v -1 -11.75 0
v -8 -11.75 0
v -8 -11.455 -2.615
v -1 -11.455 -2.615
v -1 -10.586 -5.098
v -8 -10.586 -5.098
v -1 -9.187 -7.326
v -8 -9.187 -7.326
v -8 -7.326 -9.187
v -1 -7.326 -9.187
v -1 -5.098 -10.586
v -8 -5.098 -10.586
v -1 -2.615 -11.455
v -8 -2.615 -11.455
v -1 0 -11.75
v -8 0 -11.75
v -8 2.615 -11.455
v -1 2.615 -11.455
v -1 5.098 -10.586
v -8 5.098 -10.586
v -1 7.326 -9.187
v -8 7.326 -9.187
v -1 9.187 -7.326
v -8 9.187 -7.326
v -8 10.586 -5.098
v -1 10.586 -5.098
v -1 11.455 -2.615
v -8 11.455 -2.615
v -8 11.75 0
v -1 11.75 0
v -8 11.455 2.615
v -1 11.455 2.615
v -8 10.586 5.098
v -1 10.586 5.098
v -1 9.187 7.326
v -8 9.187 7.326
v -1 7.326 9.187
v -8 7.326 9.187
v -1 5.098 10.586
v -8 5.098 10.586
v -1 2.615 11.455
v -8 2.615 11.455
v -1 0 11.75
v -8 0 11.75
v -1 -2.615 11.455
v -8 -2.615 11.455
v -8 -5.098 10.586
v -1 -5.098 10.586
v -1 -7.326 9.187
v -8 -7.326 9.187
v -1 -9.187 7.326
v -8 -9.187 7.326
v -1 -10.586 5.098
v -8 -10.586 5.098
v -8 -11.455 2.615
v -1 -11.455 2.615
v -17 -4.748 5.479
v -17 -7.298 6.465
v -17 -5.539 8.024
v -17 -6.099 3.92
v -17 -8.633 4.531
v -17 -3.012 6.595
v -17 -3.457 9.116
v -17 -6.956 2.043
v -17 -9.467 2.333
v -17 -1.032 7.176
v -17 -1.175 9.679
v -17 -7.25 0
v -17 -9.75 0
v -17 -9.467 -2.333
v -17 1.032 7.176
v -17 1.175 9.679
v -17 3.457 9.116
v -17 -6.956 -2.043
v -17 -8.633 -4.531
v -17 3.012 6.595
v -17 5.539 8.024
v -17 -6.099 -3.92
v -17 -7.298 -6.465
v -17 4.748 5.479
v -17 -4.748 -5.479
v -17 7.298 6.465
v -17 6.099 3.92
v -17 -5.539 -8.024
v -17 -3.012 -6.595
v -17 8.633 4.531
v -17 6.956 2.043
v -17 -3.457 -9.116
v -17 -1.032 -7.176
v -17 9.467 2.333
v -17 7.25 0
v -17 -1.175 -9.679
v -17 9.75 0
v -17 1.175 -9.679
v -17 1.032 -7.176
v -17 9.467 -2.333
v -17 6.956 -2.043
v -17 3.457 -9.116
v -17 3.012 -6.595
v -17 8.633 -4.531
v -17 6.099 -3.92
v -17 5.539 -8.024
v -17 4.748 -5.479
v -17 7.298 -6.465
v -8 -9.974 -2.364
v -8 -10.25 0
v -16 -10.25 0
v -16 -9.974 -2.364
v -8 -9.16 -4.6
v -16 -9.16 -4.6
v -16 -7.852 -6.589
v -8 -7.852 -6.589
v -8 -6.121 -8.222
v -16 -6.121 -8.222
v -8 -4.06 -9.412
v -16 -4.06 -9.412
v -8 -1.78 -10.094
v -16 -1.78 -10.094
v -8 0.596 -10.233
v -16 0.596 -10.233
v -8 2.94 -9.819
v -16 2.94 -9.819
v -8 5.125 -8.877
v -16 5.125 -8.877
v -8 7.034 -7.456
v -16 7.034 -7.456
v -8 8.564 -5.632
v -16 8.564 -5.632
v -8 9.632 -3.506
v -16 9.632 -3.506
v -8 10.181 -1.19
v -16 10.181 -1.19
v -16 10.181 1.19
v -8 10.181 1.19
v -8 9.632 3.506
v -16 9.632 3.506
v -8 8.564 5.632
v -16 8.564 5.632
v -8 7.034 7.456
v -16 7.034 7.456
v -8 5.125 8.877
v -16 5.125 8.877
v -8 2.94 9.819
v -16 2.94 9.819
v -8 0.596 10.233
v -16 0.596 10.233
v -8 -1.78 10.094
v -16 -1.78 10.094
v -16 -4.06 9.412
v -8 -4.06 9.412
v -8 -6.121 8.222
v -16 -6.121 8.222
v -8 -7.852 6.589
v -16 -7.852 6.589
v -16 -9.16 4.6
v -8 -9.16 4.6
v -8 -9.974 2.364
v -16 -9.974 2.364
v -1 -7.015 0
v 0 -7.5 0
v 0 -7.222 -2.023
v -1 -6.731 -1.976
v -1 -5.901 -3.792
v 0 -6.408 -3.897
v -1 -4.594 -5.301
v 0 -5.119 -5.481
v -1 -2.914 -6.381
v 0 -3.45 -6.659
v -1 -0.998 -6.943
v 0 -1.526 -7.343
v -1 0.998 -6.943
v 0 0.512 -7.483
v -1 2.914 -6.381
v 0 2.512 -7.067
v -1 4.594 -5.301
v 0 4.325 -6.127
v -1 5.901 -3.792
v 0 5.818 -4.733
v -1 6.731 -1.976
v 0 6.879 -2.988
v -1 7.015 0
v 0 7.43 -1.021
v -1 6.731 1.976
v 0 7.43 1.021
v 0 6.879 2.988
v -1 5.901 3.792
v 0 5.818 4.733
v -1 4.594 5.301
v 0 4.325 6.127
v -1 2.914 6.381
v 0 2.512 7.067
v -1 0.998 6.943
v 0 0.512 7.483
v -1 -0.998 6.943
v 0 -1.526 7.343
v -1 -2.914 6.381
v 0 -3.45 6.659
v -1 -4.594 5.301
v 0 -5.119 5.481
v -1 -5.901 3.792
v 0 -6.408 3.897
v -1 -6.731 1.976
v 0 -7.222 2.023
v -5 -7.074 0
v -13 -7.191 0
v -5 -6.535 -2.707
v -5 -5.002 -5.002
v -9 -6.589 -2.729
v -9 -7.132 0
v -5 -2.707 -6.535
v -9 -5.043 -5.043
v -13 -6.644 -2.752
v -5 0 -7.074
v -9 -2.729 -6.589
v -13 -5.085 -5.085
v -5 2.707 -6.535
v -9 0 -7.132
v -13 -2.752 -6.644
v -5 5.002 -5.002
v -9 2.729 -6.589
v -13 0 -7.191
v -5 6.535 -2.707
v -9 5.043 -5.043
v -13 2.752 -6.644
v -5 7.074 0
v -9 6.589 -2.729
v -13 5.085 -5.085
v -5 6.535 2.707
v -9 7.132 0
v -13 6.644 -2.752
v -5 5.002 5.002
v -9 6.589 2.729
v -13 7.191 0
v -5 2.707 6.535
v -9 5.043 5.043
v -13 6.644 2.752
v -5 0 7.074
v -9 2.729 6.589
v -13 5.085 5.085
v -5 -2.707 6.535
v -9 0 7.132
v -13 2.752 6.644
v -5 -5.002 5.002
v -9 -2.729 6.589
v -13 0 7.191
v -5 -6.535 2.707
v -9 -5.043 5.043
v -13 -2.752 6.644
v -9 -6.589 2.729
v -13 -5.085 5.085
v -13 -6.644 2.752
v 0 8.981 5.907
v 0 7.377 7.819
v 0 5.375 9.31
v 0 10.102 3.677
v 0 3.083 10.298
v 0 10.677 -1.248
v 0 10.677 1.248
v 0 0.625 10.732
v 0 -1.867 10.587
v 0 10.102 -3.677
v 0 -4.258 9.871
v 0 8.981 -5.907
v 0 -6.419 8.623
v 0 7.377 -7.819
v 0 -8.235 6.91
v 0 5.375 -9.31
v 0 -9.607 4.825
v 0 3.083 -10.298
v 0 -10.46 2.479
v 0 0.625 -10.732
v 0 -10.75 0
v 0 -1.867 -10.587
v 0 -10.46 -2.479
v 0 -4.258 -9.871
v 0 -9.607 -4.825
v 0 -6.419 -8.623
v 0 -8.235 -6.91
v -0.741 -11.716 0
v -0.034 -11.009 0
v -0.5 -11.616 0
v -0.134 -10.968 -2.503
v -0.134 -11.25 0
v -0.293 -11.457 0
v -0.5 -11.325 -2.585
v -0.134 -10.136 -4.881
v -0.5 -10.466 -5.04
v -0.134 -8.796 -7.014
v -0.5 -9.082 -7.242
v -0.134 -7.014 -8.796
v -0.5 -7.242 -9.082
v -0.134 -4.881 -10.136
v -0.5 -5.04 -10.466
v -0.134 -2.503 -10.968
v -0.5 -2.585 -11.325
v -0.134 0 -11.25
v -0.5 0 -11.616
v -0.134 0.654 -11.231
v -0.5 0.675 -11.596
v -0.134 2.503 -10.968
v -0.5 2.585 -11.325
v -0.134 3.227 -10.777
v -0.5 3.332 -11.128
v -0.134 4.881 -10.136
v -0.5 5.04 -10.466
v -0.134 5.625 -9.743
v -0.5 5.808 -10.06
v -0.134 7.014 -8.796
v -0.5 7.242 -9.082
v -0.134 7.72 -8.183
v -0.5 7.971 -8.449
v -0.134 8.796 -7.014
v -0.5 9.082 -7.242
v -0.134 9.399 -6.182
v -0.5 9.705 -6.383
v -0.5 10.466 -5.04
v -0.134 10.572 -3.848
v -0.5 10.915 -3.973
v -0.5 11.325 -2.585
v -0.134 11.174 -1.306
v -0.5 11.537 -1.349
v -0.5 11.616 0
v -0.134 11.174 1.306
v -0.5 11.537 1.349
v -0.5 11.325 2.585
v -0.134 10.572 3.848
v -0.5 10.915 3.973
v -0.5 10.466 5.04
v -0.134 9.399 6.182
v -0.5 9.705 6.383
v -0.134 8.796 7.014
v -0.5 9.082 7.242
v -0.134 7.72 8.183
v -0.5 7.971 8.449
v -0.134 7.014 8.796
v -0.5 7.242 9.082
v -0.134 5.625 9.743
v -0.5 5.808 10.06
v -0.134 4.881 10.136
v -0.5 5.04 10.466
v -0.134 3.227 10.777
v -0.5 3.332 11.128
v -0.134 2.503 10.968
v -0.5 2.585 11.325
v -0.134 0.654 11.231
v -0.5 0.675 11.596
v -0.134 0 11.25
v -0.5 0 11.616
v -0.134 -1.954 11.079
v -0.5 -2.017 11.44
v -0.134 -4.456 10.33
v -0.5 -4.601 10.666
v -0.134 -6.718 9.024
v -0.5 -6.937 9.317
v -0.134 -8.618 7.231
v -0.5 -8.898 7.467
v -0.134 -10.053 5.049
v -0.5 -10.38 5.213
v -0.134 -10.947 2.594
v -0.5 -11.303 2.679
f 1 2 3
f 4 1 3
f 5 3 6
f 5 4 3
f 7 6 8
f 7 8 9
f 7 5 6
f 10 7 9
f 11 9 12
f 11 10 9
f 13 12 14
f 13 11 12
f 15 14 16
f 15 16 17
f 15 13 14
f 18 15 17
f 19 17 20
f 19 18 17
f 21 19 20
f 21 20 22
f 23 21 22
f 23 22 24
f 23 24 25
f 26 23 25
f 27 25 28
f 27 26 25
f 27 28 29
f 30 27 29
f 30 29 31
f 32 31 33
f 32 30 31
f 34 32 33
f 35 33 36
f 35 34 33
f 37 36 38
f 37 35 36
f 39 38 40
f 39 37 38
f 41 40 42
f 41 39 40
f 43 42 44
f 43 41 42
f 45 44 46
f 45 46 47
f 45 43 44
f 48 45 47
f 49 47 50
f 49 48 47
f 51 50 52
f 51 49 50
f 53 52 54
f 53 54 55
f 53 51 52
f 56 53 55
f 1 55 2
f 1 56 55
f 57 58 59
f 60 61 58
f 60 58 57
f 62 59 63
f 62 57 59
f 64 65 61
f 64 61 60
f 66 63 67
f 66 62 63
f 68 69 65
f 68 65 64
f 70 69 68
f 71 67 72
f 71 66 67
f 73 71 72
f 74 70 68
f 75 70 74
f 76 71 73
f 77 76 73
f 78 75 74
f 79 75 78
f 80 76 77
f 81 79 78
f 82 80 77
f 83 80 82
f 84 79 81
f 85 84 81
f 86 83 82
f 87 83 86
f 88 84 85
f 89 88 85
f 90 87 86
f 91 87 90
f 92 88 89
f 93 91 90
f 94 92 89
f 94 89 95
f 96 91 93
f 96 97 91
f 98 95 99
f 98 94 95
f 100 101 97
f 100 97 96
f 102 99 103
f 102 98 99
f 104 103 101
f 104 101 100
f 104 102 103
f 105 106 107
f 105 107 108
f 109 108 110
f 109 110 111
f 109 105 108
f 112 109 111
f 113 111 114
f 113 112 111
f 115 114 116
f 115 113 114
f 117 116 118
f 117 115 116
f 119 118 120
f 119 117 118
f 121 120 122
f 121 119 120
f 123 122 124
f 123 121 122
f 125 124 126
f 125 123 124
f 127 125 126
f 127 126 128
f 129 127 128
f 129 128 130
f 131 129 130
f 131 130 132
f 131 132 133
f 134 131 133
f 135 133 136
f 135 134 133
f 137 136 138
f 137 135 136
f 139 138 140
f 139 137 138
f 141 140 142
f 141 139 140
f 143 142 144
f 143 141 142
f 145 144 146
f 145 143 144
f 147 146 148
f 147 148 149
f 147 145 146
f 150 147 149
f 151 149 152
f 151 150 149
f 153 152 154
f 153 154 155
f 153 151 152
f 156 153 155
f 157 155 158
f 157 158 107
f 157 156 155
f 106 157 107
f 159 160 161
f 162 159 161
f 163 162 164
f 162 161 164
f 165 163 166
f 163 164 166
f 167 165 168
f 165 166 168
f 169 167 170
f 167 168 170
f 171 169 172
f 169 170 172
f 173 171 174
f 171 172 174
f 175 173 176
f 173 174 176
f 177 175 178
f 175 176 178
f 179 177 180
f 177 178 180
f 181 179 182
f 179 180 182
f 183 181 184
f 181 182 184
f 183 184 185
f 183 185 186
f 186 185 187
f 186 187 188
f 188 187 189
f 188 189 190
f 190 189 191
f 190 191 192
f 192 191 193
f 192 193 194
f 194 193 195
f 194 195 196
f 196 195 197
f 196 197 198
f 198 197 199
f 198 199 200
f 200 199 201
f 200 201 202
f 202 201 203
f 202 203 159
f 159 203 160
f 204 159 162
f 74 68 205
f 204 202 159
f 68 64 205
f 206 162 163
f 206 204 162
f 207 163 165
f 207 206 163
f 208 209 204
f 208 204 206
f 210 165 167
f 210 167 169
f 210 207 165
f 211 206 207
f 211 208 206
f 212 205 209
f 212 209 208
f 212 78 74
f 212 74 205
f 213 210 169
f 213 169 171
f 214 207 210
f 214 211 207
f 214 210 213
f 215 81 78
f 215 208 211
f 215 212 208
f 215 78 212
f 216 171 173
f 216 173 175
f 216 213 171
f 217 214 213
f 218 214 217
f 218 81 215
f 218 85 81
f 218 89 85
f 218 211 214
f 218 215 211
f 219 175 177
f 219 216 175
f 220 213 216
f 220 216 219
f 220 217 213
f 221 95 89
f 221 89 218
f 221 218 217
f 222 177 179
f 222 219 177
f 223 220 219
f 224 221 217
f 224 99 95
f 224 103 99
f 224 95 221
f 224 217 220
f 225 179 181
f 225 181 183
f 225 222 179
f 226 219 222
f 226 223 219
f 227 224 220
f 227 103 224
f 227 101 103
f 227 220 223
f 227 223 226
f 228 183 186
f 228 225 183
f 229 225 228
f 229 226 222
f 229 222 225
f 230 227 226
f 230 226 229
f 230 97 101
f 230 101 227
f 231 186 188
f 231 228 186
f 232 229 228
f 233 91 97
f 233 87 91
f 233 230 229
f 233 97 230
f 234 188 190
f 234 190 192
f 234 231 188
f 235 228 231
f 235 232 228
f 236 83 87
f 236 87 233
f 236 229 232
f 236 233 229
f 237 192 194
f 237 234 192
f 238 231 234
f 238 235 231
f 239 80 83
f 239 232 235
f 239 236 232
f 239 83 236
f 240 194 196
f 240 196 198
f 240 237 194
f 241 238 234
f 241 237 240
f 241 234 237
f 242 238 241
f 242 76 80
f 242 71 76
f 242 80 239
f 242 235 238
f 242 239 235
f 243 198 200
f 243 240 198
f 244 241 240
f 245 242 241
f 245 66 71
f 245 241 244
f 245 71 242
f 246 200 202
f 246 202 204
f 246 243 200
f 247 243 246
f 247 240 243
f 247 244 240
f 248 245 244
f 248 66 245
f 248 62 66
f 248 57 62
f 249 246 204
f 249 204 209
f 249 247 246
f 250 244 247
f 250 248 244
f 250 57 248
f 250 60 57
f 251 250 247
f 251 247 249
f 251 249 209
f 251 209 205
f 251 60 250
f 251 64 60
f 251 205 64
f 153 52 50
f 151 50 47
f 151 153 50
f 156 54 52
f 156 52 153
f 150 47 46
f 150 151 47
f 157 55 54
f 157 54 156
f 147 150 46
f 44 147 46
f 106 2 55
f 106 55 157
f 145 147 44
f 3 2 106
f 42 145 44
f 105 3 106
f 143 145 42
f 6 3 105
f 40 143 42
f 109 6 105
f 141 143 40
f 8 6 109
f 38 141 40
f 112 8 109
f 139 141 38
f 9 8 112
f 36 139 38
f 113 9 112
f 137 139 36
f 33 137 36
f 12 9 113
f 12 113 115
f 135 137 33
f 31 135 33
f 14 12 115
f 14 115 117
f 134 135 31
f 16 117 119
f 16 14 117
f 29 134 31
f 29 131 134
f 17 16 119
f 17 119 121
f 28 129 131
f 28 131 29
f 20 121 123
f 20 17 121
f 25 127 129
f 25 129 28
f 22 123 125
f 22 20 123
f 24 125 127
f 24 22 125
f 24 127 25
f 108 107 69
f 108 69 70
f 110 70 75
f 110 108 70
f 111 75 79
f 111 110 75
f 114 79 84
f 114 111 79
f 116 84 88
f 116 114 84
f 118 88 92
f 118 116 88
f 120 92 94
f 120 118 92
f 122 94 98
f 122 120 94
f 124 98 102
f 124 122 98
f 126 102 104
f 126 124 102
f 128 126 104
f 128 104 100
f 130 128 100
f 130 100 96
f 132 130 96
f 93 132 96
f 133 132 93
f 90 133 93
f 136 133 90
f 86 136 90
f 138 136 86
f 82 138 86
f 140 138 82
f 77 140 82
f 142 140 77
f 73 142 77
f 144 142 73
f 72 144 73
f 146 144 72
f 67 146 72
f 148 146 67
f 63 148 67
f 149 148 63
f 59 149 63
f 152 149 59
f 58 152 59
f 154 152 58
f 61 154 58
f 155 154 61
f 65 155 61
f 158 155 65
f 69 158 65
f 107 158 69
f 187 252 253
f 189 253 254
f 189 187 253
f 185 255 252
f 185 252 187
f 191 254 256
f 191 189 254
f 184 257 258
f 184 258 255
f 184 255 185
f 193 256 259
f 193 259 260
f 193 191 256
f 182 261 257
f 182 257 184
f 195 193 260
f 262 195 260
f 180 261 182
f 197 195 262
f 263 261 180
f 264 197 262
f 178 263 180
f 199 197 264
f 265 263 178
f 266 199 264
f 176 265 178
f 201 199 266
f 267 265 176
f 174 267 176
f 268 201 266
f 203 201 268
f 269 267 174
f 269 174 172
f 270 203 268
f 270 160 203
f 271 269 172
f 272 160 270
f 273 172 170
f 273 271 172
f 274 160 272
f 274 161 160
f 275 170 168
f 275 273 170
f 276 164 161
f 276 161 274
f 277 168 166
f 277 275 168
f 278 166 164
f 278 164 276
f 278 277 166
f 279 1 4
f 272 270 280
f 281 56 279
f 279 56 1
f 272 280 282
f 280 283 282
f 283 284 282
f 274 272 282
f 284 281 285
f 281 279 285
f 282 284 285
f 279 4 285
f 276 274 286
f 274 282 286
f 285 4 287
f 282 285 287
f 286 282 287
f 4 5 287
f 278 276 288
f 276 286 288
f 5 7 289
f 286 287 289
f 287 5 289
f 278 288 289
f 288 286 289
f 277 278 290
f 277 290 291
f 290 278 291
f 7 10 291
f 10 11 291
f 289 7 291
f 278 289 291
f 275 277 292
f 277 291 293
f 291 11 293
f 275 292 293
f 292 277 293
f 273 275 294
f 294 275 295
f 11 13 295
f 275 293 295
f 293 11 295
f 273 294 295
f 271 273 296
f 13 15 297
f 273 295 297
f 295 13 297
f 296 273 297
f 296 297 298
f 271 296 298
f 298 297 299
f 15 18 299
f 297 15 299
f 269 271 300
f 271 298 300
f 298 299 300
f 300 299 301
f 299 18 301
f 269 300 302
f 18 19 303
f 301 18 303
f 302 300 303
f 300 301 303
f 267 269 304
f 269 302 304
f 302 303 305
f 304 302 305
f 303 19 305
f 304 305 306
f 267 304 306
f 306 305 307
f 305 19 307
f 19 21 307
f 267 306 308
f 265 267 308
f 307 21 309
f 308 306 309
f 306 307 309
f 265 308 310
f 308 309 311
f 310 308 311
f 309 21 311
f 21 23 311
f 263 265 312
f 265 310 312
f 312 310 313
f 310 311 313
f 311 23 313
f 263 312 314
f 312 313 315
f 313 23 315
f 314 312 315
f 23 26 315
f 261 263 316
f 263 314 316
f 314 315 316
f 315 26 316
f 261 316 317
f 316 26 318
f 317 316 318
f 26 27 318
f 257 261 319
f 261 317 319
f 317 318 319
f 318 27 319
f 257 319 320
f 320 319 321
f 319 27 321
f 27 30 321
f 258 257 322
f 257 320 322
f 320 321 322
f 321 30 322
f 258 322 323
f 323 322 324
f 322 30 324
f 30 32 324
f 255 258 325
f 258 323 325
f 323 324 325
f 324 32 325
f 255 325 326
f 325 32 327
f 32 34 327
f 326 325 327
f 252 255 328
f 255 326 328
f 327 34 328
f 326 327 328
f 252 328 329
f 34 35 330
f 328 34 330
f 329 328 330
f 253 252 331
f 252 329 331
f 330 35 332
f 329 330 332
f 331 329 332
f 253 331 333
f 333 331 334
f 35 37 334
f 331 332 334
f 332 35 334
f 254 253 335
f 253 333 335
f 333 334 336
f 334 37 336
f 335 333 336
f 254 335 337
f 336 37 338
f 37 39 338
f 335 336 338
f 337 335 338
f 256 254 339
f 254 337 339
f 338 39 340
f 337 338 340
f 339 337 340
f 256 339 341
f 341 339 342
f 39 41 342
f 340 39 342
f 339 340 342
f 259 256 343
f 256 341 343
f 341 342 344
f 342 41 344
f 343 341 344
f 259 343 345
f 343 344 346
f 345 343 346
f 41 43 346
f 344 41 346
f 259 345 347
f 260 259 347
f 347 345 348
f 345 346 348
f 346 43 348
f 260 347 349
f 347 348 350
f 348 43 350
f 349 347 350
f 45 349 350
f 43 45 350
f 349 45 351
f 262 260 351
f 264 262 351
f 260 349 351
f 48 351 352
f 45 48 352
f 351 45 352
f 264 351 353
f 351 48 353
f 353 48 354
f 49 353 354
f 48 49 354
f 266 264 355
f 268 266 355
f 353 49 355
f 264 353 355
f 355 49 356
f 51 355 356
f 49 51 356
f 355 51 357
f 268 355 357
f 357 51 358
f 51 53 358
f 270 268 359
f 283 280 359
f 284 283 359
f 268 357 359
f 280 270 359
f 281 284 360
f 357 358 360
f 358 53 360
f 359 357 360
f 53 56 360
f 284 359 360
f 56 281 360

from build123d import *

# Parameters (mm, degrees)
F2_SIZE2 = 1
F2_SIZE  = 0.5
F3_SIZE2 = 0.5
F3_SIZE  = 1
F4_R     = 1


with BuildPart() as f1:
    # F0 (on Top) → F1 (revolve)
    with BuildSketch(Plane.XY):
        Polygon((0, -7), (-17, -7.25), (-17, -10.25), (-8, -10.25), (-8, -11.75), (0, -11.75), align=None)
    revolve(axis=Axis((-8.5, 0, 0), (1, 0, 0)))

    # F2
    f2_edges = [f1.edges().sort_by_distance(p)[0] for p in [
        (-17, 10.25, 0),
    ]]
    chamfer(f2_edges, length=F2_SIZE, length2=F2_SIZE2)

    # F3
    f3_edges = [f1.edges().sort_by_distance(p)[0] for p in [
        (0, 7, 0),
    ]]
    chamfer(f3_edges, length=F3_SIZE, length2=F3_SIZE2)

    # F4
    f4_edges = [f1.edges().sort_by_distance(p)[0] for p in [
        (0, 11.75, 0),
    ]]
    fillet(f4_edges, radius=F4_R)


solid = f1.part
